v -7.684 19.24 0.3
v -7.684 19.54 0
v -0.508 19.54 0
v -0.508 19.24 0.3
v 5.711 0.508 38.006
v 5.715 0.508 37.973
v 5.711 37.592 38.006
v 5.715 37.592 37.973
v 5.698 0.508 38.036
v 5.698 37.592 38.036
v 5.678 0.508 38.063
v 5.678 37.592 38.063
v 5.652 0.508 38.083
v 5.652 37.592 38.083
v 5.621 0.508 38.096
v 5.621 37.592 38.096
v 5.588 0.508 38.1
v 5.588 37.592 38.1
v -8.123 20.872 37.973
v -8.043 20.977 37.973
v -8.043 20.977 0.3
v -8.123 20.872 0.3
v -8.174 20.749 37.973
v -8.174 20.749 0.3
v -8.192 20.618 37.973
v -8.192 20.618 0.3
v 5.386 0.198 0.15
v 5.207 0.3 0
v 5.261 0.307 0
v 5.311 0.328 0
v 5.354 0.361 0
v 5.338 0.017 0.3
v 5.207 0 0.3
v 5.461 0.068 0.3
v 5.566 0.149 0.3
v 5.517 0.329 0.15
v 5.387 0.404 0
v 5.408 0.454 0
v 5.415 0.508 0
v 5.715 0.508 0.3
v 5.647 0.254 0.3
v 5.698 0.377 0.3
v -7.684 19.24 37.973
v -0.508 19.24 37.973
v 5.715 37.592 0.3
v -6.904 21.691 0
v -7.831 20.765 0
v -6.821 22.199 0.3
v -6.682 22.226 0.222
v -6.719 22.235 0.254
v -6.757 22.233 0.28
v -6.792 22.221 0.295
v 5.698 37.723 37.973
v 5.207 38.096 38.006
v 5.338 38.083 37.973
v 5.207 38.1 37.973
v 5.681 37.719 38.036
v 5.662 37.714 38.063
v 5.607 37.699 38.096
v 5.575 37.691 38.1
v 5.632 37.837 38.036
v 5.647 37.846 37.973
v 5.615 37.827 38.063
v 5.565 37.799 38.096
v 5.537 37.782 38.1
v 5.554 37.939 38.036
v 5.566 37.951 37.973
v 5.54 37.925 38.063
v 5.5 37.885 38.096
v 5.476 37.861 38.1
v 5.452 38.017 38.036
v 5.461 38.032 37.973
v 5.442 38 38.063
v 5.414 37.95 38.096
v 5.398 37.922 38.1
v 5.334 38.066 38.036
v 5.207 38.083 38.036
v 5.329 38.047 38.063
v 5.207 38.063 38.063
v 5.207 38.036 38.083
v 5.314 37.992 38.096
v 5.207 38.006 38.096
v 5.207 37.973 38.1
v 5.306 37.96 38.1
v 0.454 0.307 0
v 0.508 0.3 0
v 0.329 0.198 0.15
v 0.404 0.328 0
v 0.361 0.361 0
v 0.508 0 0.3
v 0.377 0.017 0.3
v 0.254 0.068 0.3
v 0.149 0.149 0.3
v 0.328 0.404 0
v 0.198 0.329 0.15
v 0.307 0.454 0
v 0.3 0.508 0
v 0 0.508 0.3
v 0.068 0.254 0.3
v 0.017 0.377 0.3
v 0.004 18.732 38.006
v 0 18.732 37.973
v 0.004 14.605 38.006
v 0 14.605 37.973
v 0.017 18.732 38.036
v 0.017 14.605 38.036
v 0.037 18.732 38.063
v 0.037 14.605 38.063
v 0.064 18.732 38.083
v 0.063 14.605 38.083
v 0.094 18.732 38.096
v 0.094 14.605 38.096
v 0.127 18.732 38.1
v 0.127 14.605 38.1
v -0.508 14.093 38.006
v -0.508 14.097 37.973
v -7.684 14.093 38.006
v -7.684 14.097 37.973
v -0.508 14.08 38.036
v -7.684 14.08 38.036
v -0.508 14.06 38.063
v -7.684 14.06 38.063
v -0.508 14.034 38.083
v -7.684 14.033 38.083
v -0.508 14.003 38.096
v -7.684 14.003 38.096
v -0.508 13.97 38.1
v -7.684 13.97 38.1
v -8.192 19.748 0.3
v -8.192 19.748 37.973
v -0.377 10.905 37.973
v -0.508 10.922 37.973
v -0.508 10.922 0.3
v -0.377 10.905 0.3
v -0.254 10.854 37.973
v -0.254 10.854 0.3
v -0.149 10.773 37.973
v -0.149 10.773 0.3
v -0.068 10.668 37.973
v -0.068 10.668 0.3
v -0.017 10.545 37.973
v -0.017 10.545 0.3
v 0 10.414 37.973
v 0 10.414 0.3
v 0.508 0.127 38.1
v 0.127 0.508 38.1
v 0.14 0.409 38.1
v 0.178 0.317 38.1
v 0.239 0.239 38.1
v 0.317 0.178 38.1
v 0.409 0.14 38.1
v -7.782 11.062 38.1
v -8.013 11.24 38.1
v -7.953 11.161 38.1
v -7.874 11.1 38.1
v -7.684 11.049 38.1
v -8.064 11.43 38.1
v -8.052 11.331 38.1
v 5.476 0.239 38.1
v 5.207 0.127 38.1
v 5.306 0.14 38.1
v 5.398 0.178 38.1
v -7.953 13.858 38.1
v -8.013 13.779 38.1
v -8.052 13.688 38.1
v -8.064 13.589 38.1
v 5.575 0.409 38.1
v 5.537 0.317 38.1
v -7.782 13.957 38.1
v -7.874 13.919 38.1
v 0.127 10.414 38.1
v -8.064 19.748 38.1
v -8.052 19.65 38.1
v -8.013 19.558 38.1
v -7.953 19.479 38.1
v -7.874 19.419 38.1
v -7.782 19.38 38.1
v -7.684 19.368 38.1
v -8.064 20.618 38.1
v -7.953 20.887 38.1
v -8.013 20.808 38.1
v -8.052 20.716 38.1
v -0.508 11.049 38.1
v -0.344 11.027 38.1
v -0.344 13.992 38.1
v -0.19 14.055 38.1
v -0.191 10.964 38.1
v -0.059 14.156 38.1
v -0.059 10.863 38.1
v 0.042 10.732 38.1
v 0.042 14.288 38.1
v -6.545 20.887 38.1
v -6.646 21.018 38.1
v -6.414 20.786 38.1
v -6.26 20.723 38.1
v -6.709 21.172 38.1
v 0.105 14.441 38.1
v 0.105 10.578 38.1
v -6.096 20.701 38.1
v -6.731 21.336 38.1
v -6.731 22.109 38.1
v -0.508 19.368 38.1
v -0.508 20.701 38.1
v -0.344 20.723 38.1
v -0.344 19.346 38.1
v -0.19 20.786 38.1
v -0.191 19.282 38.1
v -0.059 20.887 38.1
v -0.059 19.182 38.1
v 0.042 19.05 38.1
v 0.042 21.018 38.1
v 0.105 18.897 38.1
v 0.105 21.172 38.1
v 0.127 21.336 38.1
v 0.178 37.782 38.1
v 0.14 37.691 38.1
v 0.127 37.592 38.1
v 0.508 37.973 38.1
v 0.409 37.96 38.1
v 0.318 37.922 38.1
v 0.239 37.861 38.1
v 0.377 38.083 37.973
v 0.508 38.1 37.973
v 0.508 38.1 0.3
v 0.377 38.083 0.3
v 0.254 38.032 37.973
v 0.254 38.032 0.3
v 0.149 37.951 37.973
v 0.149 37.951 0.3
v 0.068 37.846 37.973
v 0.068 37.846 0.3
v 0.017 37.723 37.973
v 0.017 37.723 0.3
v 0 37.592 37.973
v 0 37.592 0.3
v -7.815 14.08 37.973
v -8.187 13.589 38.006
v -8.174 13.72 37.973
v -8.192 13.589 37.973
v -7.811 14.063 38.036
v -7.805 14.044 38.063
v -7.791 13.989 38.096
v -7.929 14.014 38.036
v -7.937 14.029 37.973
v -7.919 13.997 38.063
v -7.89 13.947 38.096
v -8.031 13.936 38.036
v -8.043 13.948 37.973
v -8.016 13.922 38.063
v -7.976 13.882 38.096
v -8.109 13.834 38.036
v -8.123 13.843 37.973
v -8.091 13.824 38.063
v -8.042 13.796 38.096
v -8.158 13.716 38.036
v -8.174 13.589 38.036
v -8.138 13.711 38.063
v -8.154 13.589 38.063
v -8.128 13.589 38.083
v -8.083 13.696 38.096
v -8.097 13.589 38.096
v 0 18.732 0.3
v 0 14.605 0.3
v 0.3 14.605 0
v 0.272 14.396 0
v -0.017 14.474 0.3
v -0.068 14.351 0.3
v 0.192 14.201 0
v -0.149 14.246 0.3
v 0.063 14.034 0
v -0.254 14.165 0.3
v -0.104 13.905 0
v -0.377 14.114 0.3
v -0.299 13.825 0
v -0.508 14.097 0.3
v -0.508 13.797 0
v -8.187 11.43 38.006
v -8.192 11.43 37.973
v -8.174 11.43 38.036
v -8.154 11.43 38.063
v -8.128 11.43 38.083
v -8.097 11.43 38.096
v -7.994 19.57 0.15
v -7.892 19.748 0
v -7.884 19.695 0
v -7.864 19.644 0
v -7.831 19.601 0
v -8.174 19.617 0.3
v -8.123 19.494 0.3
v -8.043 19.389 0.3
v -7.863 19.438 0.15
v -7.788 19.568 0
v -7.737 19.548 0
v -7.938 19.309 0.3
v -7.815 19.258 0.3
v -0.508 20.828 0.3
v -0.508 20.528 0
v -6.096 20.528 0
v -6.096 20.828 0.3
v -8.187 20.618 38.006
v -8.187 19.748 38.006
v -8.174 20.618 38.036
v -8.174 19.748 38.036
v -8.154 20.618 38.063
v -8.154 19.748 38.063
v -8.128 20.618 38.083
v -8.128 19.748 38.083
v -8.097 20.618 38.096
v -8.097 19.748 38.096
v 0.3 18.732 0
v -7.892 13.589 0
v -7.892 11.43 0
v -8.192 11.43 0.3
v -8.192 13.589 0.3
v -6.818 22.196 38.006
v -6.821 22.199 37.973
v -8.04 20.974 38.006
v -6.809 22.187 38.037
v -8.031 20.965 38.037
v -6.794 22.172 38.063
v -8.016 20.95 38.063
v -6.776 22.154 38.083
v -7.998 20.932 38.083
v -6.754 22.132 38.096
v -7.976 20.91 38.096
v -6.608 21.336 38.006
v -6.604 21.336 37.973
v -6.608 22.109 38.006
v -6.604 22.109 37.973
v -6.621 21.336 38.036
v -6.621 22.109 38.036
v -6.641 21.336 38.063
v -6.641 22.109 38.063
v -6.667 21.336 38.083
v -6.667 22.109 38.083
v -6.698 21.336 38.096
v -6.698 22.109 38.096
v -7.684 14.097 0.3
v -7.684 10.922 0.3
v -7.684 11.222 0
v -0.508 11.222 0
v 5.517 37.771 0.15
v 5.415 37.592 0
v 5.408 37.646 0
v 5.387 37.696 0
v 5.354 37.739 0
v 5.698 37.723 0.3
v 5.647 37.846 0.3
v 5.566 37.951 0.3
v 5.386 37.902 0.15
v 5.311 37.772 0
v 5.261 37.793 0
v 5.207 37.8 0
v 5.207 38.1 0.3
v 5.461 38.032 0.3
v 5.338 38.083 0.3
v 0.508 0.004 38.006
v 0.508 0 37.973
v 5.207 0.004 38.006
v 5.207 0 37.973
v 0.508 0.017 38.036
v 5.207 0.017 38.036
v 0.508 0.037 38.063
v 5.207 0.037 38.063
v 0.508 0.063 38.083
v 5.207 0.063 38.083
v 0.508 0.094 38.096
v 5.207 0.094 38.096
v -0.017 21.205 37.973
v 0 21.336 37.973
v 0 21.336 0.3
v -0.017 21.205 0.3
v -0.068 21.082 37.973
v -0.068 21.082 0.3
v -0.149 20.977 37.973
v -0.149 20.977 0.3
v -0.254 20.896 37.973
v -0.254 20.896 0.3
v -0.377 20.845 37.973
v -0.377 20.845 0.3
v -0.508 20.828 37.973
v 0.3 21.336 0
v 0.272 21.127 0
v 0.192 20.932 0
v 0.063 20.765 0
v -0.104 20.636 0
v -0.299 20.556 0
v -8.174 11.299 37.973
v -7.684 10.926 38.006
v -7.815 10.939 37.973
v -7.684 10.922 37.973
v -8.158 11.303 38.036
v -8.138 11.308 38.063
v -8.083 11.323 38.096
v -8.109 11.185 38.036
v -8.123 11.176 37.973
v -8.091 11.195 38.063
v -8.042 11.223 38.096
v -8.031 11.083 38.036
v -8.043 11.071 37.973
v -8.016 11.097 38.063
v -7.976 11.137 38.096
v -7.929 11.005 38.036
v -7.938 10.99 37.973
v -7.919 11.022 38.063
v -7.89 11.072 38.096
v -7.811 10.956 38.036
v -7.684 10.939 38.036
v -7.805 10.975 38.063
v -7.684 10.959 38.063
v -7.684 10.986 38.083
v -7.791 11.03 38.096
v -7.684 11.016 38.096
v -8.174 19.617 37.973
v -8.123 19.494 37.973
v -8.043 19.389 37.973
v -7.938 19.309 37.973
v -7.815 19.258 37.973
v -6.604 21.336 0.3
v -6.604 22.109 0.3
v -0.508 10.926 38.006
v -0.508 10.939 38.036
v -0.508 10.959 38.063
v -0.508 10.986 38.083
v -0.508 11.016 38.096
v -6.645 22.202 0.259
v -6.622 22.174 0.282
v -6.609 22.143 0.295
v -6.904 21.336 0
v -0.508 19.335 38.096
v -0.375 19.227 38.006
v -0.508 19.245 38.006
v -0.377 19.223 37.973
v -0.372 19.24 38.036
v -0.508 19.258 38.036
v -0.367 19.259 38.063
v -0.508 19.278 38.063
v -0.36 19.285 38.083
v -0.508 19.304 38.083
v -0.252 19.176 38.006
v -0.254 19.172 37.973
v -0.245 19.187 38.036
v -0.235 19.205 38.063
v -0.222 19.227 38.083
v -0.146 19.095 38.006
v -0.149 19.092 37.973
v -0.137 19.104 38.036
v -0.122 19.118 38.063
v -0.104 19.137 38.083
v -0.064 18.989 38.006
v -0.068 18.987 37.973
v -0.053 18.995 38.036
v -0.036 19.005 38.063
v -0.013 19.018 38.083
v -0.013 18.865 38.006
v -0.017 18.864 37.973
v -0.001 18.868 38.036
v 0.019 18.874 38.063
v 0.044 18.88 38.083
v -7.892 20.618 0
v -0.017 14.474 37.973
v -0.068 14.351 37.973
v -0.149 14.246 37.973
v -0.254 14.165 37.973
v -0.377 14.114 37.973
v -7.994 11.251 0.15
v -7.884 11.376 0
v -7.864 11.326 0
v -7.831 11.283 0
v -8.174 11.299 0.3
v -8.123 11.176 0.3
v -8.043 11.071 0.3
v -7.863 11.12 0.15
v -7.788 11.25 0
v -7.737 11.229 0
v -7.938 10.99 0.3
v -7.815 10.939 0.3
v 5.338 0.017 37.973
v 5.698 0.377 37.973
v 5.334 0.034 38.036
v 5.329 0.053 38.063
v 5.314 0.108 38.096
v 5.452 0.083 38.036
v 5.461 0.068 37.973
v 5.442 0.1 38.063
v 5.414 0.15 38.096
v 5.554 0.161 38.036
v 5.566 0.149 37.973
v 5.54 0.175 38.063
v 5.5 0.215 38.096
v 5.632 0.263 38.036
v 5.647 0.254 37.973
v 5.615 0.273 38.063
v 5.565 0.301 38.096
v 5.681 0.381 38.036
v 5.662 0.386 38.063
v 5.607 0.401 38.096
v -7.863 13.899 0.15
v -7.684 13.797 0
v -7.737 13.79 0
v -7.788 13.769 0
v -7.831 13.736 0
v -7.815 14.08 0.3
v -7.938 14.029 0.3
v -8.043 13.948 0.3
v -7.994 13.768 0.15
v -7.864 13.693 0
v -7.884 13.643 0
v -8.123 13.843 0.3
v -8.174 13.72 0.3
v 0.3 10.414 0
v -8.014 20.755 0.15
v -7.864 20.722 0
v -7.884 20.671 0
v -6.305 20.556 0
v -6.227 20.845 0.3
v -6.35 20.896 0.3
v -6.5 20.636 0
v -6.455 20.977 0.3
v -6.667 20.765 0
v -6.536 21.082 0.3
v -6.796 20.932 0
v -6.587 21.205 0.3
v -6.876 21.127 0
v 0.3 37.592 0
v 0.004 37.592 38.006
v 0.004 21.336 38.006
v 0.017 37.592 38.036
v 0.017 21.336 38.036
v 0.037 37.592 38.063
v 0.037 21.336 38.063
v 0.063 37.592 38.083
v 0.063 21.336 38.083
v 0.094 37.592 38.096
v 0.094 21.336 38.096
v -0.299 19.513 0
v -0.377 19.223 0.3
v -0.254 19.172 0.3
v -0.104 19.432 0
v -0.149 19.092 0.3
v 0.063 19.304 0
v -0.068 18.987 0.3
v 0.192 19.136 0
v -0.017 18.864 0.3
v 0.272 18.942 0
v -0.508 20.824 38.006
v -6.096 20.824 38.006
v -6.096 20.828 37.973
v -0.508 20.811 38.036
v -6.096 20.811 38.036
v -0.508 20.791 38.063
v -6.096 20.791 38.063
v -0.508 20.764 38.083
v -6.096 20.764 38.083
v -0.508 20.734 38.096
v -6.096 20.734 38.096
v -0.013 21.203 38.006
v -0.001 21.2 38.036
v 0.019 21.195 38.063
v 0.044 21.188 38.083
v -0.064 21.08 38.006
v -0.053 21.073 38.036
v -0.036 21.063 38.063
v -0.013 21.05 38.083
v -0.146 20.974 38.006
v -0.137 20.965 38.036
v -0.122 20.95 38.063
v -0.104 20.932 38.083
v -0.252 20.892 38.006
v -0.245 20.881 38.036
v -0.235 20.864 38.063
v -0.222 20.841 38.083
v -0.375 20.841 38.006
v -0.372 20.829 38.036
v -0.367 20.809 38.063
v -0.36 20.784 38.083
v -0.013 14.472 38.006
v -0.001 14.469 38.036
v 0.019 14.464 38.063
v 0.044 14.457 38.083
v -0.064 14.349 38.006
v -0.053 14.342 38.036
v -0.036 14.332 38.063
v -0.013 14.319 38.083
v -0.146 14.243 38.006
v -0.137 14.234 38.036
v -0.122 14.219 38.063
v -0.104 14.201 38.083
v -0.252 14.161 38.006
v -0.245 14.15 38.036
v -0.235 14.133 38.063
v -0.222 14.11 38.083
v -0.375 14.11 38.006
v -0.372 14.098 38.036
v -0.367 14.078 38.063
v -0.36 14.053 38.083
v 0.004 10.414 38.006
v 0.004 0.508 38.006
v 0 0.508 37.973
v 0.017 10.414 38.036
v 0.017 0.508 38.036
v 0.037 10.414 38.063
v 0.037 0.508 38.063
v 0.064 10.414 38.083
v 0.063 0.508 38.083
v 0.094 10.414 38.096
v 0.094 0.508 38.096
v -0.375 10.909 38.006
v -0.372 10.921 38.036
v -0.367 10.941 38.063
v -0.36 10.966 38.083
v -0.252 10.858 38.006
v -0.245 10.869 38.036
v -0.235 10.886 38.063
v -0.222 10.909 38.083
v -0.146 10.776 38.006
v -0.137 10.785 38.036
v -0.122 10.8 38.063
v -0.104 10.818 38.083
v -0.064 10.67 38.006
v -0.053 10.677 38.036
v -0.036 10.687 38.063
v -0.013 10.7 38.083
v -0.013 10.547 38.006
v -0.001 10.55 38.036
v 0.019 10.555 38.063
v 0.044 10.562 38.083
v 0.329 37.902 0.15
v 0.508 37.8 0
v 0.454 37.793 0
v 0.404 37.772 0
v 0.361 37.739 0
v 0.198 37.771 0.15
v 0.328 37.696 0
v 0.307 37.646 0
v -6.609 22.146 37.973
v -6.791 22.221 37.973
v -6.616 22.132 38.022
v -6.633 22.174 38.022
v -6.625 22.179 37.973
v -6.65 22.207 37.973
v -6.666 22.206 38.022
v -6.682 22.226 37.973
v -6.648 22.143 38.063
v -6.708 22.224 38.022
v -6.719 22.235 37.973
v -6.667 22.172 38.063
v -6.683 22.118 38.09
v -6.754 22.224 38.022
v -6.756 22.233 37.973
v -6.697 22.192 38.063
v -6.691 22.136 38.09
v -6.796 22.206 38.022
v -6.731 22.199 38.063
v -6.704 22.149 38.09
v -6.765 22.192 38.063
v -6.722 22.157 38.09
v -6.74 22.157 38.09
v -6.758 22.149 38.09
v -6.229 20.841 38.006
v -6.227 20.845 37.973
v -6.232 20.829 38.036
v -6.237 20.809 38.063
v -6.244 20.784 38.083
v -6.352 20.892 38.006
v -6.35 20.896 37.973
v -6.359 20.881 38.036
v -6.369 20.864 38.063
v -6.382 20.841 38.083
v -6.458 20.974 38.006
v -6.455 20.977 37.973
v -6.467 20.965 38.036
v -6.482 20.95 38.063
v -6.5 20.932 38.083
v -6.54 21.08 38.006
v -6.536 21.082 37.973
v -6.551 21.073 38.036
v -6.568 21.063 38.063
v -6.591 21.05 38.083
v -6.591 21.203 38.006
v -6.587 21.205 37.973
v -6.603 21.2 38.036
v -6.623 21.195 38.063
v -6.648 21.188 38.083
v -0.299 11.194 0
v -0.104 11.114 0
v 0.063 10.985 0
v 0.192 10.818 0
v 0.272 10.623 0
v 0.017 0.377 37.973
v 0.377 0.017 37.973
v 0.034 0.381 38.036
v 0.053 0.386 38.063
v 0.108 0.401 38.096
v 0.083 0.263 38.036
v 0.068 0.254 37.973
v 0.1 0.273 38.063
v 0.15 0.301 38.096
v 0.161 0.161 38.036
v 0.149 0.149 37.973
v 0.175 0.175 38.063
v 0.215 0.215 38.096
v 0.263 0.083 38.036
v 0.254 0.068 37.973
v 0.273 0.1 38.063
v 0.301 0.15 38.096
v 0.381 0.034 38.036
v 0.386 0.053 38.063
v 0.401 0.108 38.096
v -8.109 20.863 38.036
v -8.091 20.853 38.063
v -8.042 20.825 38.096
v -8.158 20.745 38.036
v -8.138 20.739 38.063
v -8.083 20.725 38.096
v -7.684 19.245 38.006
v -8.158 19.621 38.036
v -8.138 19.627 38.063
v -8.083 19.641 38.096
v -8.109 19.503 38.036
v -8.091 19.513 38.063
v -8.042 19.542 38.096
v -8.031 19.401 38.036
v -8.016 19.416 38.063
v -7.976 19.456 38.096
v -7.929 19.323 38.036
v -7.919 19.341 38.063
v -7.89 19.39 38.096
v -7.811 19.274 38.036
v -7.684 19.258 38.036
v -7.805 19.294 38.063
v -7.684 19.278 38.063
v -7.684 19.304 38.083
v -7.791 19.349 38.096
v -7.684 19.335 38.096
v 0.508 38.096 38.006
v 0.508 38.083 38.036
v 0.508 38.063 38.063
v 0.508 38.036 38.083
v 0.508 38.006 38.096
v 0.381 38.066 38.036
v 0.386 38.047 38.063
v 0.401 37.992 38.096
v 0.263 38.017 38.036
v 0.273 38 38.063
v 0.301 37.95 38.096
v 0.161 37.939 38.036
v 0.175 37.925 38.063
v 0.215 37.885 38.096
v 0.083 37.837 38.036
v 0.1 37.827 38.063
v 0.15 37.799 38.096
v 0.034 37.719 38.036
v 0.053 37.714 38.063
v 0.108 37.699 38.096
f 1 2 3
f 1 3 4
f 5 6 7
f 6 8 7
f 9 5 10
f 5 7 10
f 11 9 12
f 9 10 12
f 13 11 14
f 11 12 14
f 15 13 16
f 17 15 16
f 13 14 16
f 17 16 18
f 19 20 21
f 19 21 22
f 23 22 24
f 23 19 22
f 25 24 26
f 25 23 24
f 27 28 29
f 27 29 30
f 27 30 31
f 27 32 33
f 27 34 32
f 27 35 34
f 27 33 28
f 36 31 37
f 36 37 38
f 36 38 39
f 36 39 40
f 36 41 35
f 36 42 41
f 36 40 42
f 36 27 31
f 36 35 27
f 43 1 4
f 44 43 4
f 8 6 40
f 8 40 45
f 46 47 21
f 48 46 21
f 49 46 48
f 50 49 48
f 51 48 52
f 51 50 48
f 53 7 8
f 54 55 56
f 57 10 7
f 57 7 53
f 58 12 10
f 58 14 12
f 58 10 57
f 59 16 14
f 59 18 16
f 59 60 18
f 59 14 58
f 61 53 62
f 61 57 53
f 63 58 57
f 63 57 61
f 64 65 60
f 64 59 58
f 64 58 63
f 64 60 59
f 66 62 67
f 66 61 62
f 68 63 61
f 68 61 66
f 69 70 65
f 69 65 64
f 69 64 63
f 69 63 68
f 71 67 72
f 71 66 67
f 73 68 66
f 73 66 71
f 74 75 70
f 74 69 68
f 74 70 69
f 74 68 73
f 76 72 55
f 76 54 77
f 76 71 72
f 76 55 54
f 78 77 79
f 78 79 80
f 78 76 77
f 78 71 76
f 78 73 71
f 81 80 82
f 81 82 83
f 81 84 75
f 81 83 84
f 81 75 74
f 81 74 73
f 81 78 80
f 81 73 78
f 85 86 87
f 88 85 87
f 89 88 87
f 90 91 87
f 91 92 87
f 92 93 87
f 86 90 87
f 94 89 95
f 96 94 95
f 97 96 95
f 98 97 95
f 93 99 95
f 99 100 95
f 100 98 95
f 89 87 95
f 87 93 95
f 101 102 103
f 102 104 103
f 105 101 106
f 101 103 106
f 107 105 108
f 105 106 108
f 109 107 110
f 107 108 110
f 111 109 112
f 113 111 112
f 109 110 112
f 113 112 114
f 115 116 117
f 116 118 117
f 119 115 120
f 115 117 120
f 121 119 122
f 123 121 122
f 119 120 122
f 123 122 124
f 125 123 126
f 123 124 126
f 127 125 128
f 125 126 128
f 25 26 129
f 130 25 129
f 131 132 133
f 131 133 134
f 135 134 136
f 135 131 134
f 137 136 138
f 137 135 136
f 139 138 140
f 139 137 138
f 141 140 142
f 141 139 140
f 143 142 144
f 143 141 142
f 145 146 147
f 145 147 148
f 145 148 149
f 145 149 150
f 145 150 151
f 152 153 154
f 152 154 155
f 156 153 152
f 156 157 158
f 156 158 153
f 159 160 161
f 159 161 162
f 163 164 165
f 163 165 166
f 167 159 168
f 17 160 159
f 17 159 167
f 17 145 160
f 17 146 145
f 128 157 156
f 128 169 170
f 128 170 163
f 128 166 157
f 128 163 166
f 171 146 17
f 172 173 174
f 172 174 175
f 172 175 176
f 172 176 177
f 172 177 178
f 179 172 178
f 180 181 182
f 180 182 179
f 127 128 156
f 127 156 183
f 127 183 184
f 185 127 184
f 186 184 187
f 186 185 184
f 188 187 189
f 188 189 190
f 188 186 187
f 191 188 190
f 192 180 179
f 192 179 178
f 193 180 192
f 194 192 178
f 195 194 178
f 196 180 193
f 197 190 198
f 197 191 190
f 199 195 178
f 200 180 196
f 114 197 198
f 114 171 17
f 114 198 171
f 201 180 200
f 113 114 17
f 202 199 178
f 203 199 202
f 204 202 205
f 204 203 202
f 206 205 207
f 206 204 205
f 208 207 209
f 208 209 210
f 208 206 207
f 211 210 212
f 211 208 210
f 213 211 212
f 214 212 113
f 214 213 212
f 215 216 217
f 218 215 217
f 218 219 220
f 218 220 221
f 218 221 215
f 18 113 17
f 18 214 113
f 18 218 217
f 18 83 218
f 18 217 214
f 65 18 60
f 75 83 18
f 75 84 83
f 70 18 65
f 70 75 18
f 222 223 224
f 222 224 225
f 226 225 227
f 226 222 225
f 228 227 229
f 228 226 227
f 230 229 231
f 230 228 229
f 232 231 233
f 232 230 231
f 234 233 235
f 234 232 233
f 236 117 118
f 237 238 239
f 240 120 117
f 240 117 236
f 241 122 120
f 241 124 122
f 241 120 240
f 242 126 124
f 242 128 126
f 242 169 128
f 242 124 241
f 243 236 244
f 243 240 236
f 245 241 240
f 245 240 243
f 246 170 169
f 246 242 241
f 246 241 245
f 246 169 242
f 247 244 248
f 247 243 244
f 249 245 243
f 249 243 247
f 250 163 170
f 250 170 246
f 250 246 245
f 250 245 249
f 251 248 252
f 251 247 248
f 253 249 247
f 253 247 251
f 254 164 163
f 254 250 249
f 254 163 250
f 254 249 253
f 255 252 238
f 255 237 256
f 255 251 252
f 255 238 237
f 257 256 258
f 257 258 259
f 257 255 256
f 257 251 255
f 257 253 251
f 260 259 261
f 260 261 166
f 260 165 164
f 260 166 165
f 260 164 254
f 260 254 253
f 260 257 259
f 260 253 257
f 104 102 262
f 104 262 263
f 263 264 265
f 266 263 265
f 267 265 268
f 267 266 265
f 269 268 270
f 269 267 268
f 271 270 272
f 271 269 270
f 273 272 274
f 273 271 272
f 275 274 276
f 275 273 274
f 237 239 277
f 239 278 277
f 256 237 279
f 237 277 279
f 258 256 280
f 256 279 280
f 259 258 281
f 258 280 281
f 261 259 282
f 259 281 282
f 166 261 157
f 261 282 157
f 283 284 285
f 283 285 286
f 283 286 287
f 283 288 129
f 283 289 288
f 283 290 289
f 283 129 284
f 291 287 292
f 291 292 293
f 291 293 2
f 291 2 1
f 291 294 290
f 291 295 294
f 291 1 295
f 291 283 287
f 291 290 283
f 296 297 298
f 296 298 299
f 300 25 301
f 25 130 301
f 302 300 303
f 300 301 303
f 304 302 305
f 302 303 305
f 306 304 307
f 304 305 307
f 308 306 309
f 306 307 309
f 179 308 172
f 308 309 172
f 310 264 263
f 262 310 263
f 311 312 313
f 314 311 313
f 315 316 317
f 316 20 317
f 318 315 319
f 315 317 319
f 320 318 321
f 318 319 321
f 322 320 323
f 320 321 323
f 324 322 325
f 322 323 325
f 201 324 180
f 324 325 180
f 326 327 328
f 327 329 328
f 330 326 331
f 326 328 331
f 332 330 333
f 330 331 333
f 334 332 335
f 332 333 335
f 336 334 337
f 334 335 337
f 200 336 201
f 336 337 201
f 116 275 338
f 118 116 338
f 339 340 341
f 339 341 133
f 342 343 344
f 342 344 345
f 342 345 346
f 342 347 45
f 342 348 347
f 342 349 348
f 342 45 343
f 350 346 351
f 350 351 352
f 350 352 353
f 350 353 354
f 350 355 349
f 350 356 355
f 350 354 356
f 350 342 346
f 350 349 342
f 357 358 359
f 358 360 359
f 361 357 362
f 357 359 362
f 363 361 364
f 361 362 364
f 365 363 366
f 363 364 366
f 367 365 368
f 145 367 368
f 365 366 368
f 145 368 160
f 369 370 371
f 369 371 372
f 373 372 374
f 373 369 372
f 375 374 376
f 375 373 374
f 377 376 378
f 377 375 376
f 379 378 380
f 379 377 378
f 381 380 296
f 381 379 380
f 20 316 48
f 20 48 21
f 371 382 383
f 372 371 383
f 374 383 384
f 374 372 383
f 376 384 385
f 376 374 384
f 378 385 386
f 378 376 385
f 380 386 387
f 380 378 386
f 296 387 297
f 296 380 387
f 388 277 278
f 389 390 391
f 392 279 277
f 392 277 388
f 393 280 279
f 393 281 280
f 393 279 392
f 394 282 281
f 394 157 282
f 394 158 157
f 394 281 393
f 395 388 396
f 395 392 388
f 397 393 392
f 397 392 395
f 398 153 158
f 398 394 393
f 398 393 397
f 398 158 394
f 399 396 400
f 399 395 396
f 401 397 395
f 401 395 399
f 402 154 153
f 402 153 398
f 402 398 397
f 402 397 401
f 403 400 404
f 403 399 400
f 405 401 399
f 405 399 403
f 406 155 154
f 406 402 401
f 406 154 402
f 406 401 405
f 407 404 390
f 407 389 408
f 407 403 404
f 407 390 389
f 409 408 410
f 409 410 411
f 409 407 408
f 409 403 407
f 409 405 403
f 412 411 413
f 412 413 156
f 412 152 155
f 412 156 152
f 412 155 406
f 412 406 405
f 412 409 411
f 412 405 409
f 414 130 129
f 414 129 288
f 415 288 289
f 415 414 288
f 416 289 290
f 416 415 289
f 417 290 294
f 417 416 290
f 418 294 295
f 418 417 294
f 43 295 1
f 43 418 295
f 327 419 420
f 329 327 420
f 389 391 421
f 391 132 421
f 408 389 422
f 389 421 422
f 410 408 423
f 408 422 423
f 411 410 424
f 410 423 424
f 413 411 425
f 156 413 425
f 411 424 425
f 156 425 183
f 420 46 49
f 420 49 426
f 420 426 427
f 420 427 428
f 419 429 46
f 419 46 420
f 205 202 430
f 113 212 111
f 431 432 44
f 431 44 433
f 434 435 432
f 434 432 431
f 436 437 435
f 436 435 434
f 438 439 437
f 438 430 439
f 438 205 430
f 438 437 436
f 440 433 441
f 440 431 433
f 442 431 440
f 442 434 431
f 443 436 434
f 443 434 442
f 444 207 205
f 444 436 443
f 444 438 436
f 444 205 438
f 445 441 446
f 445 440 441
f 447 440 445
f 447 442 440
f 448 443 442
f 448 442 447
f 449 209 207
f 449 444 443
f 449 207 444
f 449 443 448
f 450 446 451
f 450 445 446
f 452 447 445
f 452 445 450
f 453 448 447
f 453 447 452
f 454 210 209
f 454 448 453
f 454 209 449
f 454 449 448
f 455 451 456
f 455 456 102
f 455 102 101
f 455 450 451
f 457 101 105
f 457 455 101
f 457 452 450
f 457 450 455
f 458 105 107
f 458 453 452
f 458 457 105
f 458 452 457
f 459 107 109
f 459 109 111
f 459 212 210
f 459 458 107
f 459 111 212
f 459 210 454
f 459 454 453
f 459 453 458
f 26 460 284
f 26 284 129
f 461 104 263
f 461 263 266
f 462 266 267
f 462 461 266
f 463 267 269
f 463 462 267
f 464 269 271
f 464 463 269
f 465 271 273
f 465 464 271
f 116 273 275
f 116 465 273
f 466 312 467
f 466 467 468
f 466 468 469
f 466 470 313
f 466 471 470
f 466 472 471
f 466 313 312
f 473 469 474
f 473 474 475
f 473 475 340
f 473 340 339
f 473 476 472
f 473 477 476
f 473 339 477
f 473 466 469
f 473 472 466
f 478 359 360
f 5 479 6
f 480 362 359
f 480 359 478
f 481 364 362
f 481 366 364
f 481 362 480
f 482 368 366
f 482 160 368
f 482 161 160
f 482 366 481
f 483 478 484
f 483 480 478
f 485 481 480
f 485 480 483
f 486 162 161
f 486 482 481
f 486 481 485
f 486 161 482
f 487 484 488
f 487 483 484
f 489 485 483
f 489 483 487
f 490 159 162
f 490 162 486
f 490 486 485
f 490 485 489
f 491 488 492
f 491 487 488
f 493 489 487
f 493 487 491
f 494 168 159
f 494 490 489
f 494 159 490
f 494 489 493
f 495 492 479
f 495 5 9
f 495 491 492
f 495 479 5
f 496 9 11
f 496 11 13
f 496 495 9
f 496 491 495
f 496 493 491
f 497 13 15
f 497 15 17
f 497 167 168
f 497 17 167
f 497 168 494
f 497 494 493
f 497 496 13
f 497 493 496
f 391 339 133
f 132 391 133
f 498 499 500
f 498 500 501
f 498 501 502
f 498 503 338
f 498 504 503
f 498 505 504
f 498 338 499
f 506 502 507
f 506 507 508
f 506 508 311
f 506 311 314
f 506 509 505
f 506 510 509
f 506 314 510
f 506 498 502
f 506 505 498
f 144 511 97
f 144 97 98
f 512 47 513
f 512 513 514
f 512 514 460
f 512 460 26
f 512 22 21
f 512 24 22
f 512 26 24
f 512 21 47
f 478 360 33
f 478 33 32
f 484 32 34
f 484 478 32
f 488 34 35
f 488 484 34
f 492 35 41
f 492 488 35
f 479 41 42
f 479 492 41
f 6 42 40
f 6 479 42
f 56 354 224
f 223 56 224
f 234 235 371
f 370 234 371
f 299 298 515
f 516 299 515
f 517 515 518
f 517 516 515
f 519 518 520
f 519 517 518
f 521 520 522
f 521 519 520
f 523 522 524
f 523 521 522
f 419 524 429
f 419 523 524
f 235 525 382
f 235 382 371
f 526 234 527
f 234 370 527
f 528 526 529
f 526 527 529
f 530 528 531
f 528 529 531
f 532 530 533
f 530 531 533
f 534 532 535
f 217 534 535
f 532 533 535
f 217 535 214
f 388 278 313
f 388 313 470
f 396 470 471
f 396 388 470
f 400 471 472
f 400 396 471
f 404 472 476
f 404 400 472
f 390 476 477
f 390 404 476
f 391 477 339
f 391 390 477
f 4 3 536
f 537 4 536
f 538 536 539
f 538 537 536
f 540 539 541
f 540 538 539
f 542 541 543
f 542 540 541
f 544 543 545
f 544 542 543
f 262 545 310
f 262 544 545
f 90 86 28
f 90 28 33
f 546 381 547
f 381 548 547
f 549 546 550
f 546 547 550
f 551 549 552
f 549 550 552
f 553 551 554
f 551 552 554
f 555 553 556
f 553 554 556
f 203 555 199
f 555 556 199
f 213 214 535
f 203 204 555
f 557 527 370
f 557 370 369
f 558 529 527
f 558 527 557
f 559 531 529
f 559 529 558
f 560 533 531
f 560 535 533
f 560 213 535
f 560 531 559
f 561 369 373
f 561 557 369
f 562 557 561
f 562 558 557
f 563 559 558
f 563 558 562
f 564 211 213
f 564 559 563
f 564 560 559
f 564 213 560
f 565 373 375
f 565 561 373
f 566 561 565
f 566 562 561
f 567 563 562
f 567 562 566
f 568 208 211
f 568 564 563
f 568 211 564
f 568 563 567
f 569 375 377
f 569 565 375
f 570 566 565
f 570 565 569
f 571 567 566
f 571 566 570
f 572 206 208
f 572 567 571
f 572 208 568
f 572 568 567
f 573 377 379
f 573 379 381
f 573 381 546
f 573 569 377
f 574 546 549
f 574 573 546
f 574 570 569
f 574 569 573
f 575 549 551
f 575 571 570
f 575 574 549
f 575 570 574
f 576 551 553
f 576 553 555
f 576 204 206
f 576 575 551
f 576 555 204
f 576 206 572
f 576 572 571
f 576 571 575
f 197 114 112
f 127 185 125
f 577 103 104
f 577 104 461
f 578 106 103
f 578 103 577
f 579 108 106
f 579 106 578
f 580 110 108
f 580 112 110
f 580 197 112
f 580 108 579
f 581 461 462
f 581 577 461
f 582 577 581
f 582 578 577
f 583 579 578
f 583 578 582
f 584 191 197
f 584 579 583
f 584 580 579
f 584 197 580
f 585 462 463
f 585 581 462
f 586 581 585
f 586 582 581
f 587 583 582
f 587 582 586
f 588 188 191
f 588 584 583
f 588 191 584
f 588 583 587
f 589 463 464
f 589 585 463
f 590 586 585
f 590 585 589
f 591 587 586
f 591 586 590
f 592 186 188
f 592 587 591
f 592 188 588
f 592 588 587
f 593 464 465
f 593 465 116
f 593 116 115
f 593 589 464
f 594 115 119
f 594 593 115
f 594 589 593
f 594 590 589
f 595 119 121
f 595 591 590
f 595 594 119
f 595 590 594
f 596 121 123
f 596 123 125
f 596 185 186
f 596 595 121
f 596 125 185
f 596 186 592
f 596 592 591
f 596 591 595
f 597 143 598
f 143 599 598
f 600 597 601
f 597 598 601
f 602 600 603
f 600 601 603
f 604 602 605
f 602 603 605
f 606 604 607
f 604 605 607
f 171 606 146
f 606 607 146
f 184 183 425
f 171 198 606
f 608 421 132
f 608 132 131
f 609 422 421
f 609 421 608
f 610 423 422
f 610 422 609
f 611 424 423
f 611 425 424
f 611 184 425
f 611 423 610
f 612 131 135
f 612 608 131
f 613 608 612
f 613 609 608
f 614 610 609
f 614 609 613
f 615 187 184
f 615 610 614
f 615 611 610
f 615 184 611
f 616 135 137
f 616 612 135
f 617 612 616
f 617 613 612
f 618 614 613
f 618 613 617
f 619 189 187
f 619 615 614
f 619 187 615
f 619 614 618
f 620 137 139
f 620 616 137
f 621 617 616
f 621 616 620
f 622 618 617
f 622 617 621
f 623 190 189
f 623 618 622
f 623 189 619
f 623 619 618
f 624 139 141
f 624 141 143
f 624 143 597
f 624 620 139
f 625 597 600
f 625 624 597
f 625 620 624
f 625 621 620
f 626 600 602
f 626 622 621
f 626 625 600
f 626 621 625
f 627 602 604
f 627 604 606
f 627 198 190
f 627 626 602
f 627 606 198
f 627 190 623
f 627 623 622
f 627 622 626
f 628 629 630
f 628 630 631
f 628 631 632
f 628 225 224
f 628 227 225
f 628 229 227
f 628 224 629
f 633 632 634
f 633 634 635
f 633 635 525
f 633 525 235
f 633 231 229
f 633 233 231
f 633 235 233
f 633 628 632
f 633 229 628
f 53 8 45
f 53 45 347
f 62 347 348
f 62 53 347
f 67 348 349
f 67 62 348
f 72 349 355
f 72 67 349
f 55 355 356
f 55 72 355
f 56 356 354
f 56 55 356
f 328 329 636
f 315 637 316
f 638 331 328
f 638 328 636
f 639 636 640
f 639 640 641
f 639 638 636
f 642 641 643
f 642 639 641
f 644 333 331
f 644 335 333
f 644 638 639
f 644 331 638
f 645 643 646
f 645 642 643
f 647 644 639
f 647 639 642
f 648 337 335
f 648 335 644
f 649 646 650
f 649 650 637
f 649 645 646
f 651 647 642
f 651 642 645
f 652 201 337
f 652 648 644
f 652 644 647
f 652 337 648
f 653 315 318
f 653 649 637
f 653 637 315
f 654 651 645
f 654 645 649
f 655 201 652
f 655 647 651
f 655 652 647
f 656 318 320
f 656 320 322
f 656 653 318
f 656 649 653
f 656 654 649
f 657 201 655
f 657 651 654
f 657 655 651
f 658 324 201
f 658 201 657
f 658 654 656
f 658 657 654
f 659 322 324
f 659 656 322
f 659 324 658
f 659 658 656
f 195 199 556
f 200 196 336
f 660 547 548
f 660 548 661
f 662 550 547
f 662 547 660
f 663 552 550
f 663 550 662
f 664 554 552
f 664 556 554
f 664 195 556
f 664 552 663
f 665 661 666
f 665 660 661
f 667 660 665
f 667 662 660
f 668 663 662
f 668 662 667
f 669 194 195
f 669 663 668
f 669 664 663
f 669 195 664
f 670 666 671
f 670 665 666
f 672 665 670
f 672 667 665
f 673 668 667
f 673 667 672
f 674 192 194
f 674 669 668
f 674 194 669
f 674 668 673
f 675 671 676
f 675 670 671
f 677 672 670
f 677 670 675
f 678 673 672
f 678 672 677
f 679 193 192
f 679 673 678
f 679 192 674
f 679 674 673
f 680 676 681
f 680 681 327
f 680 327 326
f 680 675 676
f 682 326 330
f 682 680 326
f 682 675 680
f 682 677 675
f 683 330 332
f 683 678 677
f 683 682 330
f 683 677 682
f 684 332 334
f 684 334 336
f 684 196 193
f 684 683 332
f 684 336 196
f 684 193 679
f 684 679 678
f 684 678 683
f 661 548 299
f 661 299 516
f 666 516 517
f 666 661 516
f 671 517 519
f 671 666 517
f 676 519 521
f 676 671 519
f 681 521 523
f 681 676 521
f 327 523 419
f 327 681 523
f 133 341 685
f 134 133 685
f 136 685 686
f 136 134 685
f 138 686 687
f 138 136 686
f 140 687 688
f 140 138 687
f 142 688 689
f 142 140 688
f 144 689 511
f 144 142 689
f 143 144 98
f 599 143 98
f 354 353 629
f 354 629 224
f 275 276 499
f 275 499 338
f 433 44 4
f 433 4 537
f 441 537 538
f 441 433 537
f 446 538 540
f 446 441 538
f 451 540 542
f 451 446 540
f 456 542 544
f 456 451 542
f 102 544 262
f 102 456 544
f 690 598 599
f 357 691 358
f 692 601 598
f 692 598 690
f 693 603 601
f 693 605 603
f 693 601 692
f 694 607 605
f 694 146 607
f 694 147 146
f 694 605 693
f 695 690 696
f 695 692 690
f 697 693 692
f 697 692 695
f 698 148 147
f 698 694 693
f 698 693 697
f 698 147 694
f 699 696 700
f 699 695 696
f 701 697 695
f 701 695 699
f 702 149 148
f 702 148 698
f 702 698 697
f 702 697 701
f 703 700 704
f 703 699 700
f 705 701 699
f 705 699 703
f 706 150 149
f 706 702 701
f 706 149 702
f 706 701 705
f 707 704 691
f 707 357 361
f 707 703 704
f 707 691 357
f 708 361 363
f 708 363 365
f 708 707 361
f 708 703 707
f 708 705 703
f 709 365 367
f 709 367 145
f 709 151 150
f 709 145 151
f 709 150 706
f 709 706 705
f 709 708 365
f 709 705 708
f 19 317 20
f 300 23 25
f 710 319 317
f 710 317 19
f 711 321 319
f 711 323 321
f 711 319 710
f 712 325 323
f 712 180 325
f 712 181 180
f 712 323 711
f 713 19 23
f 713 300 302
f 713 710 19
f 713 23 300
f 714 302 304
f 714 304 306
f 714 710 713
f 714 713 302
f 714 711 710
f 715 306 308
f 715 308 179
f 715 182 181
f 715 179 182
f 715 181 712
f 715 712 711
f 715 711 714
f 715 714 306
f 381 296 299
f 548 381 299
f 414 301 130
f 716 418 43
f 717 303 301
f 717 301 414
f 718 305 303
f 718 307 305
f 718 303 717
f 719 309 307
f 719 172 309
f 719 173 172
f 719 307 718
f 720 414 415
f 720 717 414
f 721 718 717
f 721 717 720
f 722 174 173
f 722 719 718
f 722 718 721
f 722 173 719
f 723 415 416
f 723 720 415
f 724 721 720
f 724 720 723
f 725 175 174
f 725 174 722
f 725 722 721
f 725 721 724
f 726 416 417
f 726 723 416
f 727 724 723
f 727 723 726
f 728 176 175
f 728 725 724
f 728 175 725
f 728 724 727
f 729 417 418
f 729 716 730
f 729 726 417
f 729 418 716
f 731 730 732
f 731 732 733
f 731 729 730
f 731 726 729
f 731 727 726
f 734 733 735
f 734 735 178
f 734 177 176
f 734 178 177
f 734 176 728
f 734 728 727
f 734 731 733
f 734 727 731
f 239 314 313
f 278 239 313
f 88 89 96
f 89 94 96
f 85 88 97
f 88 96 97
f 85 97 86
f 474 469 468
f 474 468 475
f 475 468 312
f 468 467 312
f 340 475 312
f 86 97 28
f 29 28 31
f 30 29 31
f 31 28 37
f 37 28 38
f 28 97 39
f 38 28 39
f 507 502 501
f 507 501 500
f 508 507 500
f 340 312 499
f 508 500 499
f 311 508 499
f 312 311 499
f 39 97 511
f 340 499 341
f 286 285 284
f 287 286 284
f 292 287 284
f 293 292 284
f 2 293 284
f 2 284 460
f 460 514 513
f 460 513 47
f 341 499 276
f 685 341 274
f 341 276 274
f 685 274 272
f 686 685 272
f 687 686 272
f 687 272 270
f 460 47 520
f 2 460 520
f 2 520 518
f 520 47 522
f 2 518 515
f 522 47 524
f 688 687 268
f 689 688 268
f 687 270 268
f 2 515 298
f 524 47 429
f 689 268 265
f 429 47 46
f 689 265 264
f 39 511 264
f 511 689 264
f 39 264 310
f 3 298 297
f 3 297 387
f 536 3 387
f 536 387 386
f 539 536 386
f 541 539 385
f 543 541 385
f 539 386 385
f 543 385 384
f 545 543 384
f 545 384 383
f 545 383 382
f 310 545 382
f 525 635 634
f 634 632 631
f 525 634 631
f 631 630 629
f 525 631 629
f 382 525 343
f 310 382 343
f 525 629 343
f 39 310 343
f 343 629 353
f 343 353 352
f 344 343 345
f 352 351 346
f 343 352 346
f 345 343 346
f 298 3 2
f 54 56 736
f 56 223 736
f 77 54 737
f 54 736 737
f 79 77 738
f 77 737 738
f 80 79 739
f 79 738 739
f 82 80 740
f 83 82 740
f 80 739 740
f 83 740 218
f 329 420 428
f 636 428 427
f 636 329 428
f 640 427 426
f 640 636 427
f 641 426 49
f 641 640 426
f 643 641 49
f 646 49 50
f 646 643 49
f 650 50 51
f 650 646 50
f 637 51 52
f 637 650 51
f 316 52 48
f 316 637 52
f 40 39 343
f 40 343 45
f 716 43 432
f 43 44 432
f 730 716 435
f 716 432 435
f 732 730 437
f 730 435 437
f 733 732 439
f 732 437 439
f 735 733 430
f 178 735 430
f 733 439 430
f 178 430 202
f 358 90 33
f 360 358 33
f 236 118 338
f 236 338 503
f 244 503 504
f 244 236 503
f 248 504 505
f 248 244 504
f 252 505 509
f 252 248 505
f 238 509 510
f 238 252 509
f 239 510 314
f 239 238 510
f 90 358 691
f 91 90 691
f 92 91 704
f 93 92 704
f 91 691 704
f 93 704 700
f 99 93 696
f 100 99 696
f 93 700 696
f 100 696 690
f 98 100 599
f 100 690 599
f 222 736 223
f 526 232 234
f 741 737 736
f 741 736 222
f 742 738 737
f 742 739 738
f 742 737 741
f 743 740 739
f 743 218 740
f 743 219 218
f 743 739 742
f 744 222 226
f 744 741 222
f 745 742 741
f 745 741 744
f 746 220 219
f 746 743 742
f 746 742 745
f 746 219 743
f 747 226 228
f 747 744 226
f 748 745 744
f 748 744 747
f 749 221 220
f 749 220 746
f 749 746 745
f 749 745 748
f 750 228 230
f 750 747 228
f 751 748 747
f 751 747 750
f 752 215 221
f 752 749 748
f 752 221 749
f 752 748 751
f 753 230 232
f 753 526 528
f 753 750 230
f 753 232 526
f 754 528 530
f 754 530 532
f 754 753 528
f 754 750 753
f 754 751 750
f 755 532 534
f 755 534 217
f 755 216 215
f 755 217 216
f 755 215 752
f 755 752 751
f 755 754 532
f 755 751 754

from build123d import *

# Parameters (mm, degrees)
BOSS_EXTRUDE1_DEPTH = 38.1
FILLET1_R           = 0.508
FILLET2_R           = 0.127
CHAMFER1_SIZE       = 0.3
FILLET3_R           = 0.127


with BuildPart() as part:
    # Sketch1 → Boss-Extrude1 (new body)
    with BuildSketch(Plane.XY):
        Polygon((0, 0), (5.715, 0), (5.715, 38.1), (0, 38.1), (0, 20.828), (-6.604, 20.828), (-6.604, 22.4155), (-8.1915, 20.828), (-8.1915, 19.2405), (0, 19.2405), (0, 14.097), (-8.1915, 14.097), (-8.1915, 10.922), (0, 10.922), align=None)
    extrude(amount=BOSS_EXTRUDE1_DEPTH)

    # Fillet1
    fillet1_edges = [part.edges().sort_by_distance(p)[0] for p in [
        (0, 0, 19.05),
        (0, 10.922, 19.05),
        (-8.1915, 10.922, 19.05),
        (-8.1915, 14.097, 19.05),
        (0, 14.097, 19.05),
        (0, 19.2405, 19.05),
        (-8.1915, 19.2405, 19.05),
        (-8.1915, 20.828, 19.05),
        (-6.604, 20.828, 19.05),
        (0, 20.828, 19.05),
        (0, 38.1, 19.05),
        (5.715, 38.1, 19.05),
        (5.715, 0, 19.05),
    ]]
    fillet(fillet1_edges, radius=FILLET1_R)

    # Fillet2
    fillet2_edges = [part.edges().sort_by_distance(p)[0] for p in [
        (-6.604, 22.4155, 19.05),
    ]]
    fillet(fillet2_edges, radius=FILLET2_R)

    # Chamfer1
    # the kernel refuses this chamfer: 0.3 mm, written as the material it takes off along each edge
    with BuildSketch(Plane(origin=(-6.275266217, 22.744233783, 0), x_dir=(0.7068394360706772, -0.7068394360706697, -0.02749587661058634), z_dir=(-0.7071067811865438, -0.7071067811865513, 0))) as chamfer1_piece_1:
        Polygon((CHAMFER1_SIZE * 0.999621916911, CHAMFER1_SIZE * 0.0274958766106), (-CHAMFER1_SIZE * 0.0274958766106, CHAMFER1_SIZE * 0.999621916911), (0, 0), align=None)
    extrude(amount=2.499543315, mode=Mode.SUBTRACT)
    with BuildSketch(Plane(origin=(-7.6835, 19.2405, 0), x_dir=(0, 0.9996219169112968, -0.02749587661058633), z_dir=(1, 0, 0)), Plane(origin=(-7.6835, 10.922, 0), x_dir=(0, 0.9996219169112968, -0.02749587661058633), z_dir=(1, 0, 0)), Plane(origin=(-0.508, 14.097, 0), x_dir=(0, -0.9996219169112968, -0.02749587661058633), z_dir=(-1, 0, 0))) as chamfer1_piece_2:
        Polygon((CHAMFER1_SIZE * 0.999621916911, CHAMFER1_SIZE * 0.0274958766106), (-CHAMFER1_SIZE * 0.0274958766106, CHAMFER1_SIZE * 0.999621916911), (0, 0), align=None)
    extrude(amount=7.1755, mode=Mode.SUBTRACT)
    with BuildSketch(Plane(origin=(0.508, 0, 0), x_dir=(0, 0.9996219169112968, -0.027495876610586275), z_dir=(1, 0, 0)), Plane(origin=(5.207, 38.1, 0), x_dir=(0, -0.9996219169112968, -0.027495876610586494), z_dir=(-1, 0, 0))) as chamfer1_piece_3:
        Polygon((CHAMFER1_SIZE * 0.999621916911, CHAMFER1_SIZE * 0.0274958766106), (-CHAMFER1_SIZE * 0.0274958766106, CHAMFER1_SIZE * 0.999621916911), (0, 0), align=None)
    extrude(amount=4.699, mode=Mode.SUBTRACT)
    with BuildSketch(Plane(origin=(0, 10.414, 0), x_dir=(0.9996219169112968, 0, -0.02749587661058637), z_dir=(0, -1, 0))) as chamfer1_piece_4:
        Polygon((CHAMFER1_SIZE * 0.999621916911, CHAMFER1_SIZE * 0.0274958766106), (-CHAMFER1_SIZE * 0.0274958766106, CHAMFER1_SIZE * 0.999621916911), (0, 0), align=None)
    extrude(amount=9.906, mode=Mode.SUBTRACT)
    with BuildSketch(Plane(origin=(-8.1915, 13.589, 0), x_dir=(0.9996219169112968, 0, -0.02749587661058637), z_dir=(0, -1, 0))) as chamfer1_piece_5:
        Polygon((CHAMFER1_SIZE * 0.999621916911, CHAMFER1_SIZE * 0.0274958766106), (-CHAMFER1_SIZE * 0.0274958766106, CHAMFER1_SIZE * 0.999621916911), (0, 0), align=None)
    extrude(amount=2.159, mode=Mode.SUBTRACT)
    with BuildSketch(Plane(origin=(0, 18.7325, 0), x_dir=(0.9996219169112968, 0, -0.02749587661058637), z_dir=(0, -1, 0))) as chamfer1_piece_6:
        Polygon((CHAMFER1_SIZE * 0.999621916911, CHAMFER1_SIZE * 0.0274958766106), (-CHAMFER1_SIZE * 0.0274958766106, CHAMFER1_SIZE * 0.999621916911), (0, 0), align=None)
    extrude(amount=4.1275, mode=Mode.SUBTRACT)
    with BuildSketch(Plane(origin=(-8.1915, 20.61757951, 0), x_dir=(0.9996219169112968, 1.118541876484896e-15, -0.02749587661058637), z_dir=(0, -1, 0))) as chamfer1_piece_7:
        Polygon((CHAMFER1_SIZE * 0.999621916911, CHAMFER1_SIZE * 0.0274958766106), (-CHAMFER1_SIZE * 0.0274958766106, CHAMFER1_SIZE * 0.999621916911), (0, 0), align=None)
    extrude(amount=0.86907951, mode=Mode.SUBTRACT)
    with BuildSketch(Plane(origin=(-6.604, 21.336, 0), x_dir=(-0.9996219169112968, 0, -0.02749587661058637), z_dir=(0, 1, 0))) as chamfer1_piece_8:
        Polygon((CHAMFER1_SIZE * 0.999621916911, CHAMFER1_SIZE * 0.0274958766106), (-CHAMFER1_SIZE * 0.0274958766106, CHAMFER1_SIZE * 0.999621916911), (0, 0), align=None)
    extrude(amount=1.544399774, mode=Mode.SUBTRACT)
    with BuildSketch(Plane(origin=(-0.508, 20.828, 0), x_dir=(0, -0.9996219169112968, -0.02749587661058633), z_dir=(-1, 0, 0))) as chamfer1_piece_9:
        Polygon((CHAMFER1_SIZE * 0.999621916911, CHAMFER1_SIZE * 0.0274958766106), (-CHAMFER1_SIZE * 0.0274958766106, CHAMFER1_SIZE * 0.999621916911), (0, 0), align=None)
    extrude(amount=5.588, mode=Mode.SUBTRACT)
    with BuildSketch(Plane(origin=(0, 37.592, 0), x_dir=(0.9996219169112968, 0, -0.02749587661058637), z_dir=(0, -1, 0))) as chamfer1_piece_10:
        Polygon((CHAMFER1_SIZE * 0.999621916911, CHAMFER1_SIZE * 0.0274958766106), (-CHAMFER1_SIZE * 0.0274958766106, CHAMFER1_SIZE * 0.999621916911), (0, 0), align=None)
    extrude(amount=16.256, mode=Mode.SUBTRACT)
    with BuildSketch(Plane(origin=(5.715, 0.508, 0), x_dir=(-0.9996219169112968, 0, -0.02749587661058637), z_dir=(0, 1, 0))) as chamfer1_piece_11:
        Polygon((CHAMFER1_SIZE * 0.999621916911, CHAMFER1_SIZE * 0.0274958766106), (-CHAMFER1_SIZE * 0.0274958766106, CHAMFER1_SIZE * 0.999621916911), (0, 0), align=None)
    extrude(amount=37.084, mode=Mode.SUBTRACT)
    with BuildSketch(Plane(origin=(-7.6835, 13.589, 0), x_dir=(0, 1, 0), z_dir=(1, 0, 0))) as chamfer1_piece_12:
        Polygon((0.508 - CHAMFER1_SIZE, 0), (0.508, CHAMFER1_SIZE), (0.508, 0), align=None)
    revolve(axis=Axis((-7.6835, 13.589, 0), (0, 0, 1)), revolution_arc=90, mode=Mode.SUBTRACT)
    with BuildSketch(Plane(origin=(-7.6835, 11.43, 0), x_dir=(-1, 0, 0), z_dir=(0, 1, 0))) as chamfer1_piece_13:
        Polygon((0.508 - CHAMFER1_SIZE, 0), (0.508, CHAMFER1_SIZE), (0.508, 0), align=None)
    revolve(axis=Axis((-7.6835, 11.43, 0), (0, 0, 1)), revolution_arc=90, mode=Mode.SUBTRACT)
    with BuildSketch(Plane(origin=(0.508, 0.508, 0), x_dir=(0, -1, 0), z_dir=(1, 0, 0))) as chamfer1_piece_14:
        Polygon((0.508 - CHAMFER1_SIZE, 0), (0.508, -CHAMFER1_SIZE), (0.508, 0), align=None)
    revolve(axis=Axis((0.508, 0.508, 0), (0, 0, -1)), revolution_arc=90, mode=Mode.SUBTRACT)
    with BuildSketch(Plane(origin=(0.508, 37.592, 0), x_dir=(0, 1, 0), z_dir=(1, 0, 0))) as chamfer1_piece_15:
        Polygon((0.508 - CHAMFER1_SIZE, 0), (0.508, CHAMFER1_SIZE), (0.508, 0), align=None)
    revolve(axis=Axis((0.508, 37.592, 0), (0, 0, 1)), revolution_arc=90, mode=Mode.SUBTRACT)
    with BuildSketch(Plane(origin=(5.207, 0.508, 0), x_dir=(0, -1, 0), z_dir=(-1, 0, 0))) as chamfer1_piece_16:
        Polygon((0.508 - CHAMFER1_SIZE, 0), (0.508, CHAMFER1_SIZE), (0.508, 0), align=None)
    revolve(axis=Axis((5.207, 0.508, 0), (0, 0, 1)), revolution_arc=90, mode=Mode.SUBTRACT)
    with BuildSketch(Plane(origin=(5.207, 37.592, 0), x_dir=(1, 0, 0), z_dir=(0, -1, 0))) as chamfer1_piece_17:
        Polygon((0.508 - CHAMFER1_SIZE, 0), (0.508, CHAMFER1_SIZE), (0.508, 0), align=None)
    revolve(axis=Axis((5.207, 37.592, 0), (0, 0, 1)), revolution_arc=90, mode=Mode.SUBTRACT)
    with BuildSketch(Plane(origin=(-7.6835, 20.61757951, 0), x_dir=(-0.7071067811865519, 0.7071067811865432, 0), z_dir=(0.7071067811865432, 0.7071067811865519, 0))) as chamfer1_piece_18:
        Polygon((0.508 - CHAMFER1_SIZE, 0), (0.508, CHAMFER1_SIZE), (0.508, 0), align=None)
    revolve(axis=Axis((-7.6835, 20.61757951, 0), (0, 0, 1)), revolution_arc=45, mode=Mode.SUBTRACT)
    with BuildSketch(Plane(origin=(-7.6835, 19.7485, 0), x_dir=(-1, 0, 0), z_dir=(0, 1, 0))) as chamfer1_piece_19:
        Polygon((0.508 - CHAMFER1_SIZE, 0), (0.508, CHAMFER1_SIZE), (0.508, 0), align=None)
    revolve(axis=Axis((-7.6835, 19.7485, 0), (0, 0, 1)), revolution_arc=90, mode=Mode.SUBTRACT)
    with BuildSketch(Plane(origin=(-0.508, 14.605, 0), x_dir=(1, 0, 0), z_dir=(0, 1, 0))) as chamfer1_piece_20:
        Polygon((0.508 + CHAMFER1_SIZE, 0), (0.508, -CHAMFER1_SIZE), (0.508, 0), align=None)
    revolve(axis=Axis((-0.508, 14.605, 0), (0, 0, -1)), revolution_arc=90, mode=Mode.SUBTRACT)
    with BuildSketch(Plane(origin=(-0.508, 18.7325, 0), x_dir=(0, 1, 0), z_dir=(-1, 0, 0))) as chamfer1_piece_21:
        Polygon((0.508 + CHAMFER1_SIZE, 0), (0.508, -CHAMFER1_SIZE), (0.508, 0), align=None)
    revolve(axis=Axis((-0.508, 18.7325, 0), (0, 0, -1)), revolution_arc=90, mode=Mode.SUBTRACT)
    with BuildSketch(Plane(origin=(-0.508, 10.414, 0), x_dir=(0, 1, 0), z_dir=(-1, 0, 0))) as chamfer1_piece_22:
        Polygon((0.508 + CHAMFER1_SIZE, 0), (0.508, -CHAMFER1_SIZE), (0.508, 0), align=None)
    revolve(axis=Axis((-0.508, 10.414, 0), (0, 0, -1)), revolution_arc=90, mode=Mode.SUBTRACT)
    with BuildSketch(Plane(origin=(-6.096, 21.336, 0), x_dir=(0, -1, 0), z_dir=(1, 0, 0))) as chamfer1_piece_23:
        Polygon((0.508 + CHAMFER1_SIZE, 0), (0.508, -CHAMFER1_SIZE), (0.508, 0), align=None)
    revolve(axis=Axis((-6.096, 21.336, 0), (0, 0, -1)), revolution_arc=90, mode=Mode.SUBTRACT)
    with BuildSketch(Plane(origin=(-0.508, 21.336, 0), x_dir=(1, 0, 0), z_dir=(0, 1, 0))) as chamfer1_piece_24:
        Polygon((0.508 + CHAMFER1_SIZE, 0), (0.508, -CHAMFER1_SIZE), (0.508, 0), align=None)
    revolve(axis=Axis((-0.508, 21.336, 0), (0, 0, -1)), revolution_arc=90, mode=Mode.SUBTRACT)

    # Fillet3
    fillet3_edges = [part.edges().sort_by_distance(p)[0] for p in [
        (-7.431756403, 21.587743597, 38.1),
        (-6.682399204, 22.226227578, 38.1),
        (-4.09575, 19.2405, 38.1),
        (-8.1915, 20.183039755, 38.1),
        (2.8575, 0, 38.1),
        (5.715, 19.05, 38.1),
        (2.8575, 38.1, 38.1),
        (0, 29.464, 38.1),
        (-3.302, 20.828, 38.1),
        (-6.604, 21.722447439, 38.1),
        (0, 16.66875, 38.1),
        (-4.09575, 14.097, 38.1),
        (-8.1915, 12.5095, 38.1),
        (-4.09575, 10.922, 38.1),
        (0, 5.461, 38.1),
        (-8.042710245, 13.948210245, 38.1),
        (-8.042710245, 11.070789755, 38.1),
        (0.148789755, 0.148789755, 38.1),
        (0.148789755, 37.951210245, 38.1),
        (5.566210245, 0.148789755, 38.1),
        (5.566210245, 37.951210245, 38.1),
        (-8.152830803, 20.811982694, 38.1),
        (-8.042710245, 19.389289755, 38.1),
        (-0.148789755, 14.245789755, 38.1),
        (-0.148789755, 19.091710245, 38.1),
        (-0.148789755, 10.773210245, 38.1),
        (-6.455210245, 20.976789755, 38.1),
        (-0.148789755, 20.976789755, 38.1),
    ]]
    fillet(fillet3_edges, radius=FILLET3_R)


solid = part.part
